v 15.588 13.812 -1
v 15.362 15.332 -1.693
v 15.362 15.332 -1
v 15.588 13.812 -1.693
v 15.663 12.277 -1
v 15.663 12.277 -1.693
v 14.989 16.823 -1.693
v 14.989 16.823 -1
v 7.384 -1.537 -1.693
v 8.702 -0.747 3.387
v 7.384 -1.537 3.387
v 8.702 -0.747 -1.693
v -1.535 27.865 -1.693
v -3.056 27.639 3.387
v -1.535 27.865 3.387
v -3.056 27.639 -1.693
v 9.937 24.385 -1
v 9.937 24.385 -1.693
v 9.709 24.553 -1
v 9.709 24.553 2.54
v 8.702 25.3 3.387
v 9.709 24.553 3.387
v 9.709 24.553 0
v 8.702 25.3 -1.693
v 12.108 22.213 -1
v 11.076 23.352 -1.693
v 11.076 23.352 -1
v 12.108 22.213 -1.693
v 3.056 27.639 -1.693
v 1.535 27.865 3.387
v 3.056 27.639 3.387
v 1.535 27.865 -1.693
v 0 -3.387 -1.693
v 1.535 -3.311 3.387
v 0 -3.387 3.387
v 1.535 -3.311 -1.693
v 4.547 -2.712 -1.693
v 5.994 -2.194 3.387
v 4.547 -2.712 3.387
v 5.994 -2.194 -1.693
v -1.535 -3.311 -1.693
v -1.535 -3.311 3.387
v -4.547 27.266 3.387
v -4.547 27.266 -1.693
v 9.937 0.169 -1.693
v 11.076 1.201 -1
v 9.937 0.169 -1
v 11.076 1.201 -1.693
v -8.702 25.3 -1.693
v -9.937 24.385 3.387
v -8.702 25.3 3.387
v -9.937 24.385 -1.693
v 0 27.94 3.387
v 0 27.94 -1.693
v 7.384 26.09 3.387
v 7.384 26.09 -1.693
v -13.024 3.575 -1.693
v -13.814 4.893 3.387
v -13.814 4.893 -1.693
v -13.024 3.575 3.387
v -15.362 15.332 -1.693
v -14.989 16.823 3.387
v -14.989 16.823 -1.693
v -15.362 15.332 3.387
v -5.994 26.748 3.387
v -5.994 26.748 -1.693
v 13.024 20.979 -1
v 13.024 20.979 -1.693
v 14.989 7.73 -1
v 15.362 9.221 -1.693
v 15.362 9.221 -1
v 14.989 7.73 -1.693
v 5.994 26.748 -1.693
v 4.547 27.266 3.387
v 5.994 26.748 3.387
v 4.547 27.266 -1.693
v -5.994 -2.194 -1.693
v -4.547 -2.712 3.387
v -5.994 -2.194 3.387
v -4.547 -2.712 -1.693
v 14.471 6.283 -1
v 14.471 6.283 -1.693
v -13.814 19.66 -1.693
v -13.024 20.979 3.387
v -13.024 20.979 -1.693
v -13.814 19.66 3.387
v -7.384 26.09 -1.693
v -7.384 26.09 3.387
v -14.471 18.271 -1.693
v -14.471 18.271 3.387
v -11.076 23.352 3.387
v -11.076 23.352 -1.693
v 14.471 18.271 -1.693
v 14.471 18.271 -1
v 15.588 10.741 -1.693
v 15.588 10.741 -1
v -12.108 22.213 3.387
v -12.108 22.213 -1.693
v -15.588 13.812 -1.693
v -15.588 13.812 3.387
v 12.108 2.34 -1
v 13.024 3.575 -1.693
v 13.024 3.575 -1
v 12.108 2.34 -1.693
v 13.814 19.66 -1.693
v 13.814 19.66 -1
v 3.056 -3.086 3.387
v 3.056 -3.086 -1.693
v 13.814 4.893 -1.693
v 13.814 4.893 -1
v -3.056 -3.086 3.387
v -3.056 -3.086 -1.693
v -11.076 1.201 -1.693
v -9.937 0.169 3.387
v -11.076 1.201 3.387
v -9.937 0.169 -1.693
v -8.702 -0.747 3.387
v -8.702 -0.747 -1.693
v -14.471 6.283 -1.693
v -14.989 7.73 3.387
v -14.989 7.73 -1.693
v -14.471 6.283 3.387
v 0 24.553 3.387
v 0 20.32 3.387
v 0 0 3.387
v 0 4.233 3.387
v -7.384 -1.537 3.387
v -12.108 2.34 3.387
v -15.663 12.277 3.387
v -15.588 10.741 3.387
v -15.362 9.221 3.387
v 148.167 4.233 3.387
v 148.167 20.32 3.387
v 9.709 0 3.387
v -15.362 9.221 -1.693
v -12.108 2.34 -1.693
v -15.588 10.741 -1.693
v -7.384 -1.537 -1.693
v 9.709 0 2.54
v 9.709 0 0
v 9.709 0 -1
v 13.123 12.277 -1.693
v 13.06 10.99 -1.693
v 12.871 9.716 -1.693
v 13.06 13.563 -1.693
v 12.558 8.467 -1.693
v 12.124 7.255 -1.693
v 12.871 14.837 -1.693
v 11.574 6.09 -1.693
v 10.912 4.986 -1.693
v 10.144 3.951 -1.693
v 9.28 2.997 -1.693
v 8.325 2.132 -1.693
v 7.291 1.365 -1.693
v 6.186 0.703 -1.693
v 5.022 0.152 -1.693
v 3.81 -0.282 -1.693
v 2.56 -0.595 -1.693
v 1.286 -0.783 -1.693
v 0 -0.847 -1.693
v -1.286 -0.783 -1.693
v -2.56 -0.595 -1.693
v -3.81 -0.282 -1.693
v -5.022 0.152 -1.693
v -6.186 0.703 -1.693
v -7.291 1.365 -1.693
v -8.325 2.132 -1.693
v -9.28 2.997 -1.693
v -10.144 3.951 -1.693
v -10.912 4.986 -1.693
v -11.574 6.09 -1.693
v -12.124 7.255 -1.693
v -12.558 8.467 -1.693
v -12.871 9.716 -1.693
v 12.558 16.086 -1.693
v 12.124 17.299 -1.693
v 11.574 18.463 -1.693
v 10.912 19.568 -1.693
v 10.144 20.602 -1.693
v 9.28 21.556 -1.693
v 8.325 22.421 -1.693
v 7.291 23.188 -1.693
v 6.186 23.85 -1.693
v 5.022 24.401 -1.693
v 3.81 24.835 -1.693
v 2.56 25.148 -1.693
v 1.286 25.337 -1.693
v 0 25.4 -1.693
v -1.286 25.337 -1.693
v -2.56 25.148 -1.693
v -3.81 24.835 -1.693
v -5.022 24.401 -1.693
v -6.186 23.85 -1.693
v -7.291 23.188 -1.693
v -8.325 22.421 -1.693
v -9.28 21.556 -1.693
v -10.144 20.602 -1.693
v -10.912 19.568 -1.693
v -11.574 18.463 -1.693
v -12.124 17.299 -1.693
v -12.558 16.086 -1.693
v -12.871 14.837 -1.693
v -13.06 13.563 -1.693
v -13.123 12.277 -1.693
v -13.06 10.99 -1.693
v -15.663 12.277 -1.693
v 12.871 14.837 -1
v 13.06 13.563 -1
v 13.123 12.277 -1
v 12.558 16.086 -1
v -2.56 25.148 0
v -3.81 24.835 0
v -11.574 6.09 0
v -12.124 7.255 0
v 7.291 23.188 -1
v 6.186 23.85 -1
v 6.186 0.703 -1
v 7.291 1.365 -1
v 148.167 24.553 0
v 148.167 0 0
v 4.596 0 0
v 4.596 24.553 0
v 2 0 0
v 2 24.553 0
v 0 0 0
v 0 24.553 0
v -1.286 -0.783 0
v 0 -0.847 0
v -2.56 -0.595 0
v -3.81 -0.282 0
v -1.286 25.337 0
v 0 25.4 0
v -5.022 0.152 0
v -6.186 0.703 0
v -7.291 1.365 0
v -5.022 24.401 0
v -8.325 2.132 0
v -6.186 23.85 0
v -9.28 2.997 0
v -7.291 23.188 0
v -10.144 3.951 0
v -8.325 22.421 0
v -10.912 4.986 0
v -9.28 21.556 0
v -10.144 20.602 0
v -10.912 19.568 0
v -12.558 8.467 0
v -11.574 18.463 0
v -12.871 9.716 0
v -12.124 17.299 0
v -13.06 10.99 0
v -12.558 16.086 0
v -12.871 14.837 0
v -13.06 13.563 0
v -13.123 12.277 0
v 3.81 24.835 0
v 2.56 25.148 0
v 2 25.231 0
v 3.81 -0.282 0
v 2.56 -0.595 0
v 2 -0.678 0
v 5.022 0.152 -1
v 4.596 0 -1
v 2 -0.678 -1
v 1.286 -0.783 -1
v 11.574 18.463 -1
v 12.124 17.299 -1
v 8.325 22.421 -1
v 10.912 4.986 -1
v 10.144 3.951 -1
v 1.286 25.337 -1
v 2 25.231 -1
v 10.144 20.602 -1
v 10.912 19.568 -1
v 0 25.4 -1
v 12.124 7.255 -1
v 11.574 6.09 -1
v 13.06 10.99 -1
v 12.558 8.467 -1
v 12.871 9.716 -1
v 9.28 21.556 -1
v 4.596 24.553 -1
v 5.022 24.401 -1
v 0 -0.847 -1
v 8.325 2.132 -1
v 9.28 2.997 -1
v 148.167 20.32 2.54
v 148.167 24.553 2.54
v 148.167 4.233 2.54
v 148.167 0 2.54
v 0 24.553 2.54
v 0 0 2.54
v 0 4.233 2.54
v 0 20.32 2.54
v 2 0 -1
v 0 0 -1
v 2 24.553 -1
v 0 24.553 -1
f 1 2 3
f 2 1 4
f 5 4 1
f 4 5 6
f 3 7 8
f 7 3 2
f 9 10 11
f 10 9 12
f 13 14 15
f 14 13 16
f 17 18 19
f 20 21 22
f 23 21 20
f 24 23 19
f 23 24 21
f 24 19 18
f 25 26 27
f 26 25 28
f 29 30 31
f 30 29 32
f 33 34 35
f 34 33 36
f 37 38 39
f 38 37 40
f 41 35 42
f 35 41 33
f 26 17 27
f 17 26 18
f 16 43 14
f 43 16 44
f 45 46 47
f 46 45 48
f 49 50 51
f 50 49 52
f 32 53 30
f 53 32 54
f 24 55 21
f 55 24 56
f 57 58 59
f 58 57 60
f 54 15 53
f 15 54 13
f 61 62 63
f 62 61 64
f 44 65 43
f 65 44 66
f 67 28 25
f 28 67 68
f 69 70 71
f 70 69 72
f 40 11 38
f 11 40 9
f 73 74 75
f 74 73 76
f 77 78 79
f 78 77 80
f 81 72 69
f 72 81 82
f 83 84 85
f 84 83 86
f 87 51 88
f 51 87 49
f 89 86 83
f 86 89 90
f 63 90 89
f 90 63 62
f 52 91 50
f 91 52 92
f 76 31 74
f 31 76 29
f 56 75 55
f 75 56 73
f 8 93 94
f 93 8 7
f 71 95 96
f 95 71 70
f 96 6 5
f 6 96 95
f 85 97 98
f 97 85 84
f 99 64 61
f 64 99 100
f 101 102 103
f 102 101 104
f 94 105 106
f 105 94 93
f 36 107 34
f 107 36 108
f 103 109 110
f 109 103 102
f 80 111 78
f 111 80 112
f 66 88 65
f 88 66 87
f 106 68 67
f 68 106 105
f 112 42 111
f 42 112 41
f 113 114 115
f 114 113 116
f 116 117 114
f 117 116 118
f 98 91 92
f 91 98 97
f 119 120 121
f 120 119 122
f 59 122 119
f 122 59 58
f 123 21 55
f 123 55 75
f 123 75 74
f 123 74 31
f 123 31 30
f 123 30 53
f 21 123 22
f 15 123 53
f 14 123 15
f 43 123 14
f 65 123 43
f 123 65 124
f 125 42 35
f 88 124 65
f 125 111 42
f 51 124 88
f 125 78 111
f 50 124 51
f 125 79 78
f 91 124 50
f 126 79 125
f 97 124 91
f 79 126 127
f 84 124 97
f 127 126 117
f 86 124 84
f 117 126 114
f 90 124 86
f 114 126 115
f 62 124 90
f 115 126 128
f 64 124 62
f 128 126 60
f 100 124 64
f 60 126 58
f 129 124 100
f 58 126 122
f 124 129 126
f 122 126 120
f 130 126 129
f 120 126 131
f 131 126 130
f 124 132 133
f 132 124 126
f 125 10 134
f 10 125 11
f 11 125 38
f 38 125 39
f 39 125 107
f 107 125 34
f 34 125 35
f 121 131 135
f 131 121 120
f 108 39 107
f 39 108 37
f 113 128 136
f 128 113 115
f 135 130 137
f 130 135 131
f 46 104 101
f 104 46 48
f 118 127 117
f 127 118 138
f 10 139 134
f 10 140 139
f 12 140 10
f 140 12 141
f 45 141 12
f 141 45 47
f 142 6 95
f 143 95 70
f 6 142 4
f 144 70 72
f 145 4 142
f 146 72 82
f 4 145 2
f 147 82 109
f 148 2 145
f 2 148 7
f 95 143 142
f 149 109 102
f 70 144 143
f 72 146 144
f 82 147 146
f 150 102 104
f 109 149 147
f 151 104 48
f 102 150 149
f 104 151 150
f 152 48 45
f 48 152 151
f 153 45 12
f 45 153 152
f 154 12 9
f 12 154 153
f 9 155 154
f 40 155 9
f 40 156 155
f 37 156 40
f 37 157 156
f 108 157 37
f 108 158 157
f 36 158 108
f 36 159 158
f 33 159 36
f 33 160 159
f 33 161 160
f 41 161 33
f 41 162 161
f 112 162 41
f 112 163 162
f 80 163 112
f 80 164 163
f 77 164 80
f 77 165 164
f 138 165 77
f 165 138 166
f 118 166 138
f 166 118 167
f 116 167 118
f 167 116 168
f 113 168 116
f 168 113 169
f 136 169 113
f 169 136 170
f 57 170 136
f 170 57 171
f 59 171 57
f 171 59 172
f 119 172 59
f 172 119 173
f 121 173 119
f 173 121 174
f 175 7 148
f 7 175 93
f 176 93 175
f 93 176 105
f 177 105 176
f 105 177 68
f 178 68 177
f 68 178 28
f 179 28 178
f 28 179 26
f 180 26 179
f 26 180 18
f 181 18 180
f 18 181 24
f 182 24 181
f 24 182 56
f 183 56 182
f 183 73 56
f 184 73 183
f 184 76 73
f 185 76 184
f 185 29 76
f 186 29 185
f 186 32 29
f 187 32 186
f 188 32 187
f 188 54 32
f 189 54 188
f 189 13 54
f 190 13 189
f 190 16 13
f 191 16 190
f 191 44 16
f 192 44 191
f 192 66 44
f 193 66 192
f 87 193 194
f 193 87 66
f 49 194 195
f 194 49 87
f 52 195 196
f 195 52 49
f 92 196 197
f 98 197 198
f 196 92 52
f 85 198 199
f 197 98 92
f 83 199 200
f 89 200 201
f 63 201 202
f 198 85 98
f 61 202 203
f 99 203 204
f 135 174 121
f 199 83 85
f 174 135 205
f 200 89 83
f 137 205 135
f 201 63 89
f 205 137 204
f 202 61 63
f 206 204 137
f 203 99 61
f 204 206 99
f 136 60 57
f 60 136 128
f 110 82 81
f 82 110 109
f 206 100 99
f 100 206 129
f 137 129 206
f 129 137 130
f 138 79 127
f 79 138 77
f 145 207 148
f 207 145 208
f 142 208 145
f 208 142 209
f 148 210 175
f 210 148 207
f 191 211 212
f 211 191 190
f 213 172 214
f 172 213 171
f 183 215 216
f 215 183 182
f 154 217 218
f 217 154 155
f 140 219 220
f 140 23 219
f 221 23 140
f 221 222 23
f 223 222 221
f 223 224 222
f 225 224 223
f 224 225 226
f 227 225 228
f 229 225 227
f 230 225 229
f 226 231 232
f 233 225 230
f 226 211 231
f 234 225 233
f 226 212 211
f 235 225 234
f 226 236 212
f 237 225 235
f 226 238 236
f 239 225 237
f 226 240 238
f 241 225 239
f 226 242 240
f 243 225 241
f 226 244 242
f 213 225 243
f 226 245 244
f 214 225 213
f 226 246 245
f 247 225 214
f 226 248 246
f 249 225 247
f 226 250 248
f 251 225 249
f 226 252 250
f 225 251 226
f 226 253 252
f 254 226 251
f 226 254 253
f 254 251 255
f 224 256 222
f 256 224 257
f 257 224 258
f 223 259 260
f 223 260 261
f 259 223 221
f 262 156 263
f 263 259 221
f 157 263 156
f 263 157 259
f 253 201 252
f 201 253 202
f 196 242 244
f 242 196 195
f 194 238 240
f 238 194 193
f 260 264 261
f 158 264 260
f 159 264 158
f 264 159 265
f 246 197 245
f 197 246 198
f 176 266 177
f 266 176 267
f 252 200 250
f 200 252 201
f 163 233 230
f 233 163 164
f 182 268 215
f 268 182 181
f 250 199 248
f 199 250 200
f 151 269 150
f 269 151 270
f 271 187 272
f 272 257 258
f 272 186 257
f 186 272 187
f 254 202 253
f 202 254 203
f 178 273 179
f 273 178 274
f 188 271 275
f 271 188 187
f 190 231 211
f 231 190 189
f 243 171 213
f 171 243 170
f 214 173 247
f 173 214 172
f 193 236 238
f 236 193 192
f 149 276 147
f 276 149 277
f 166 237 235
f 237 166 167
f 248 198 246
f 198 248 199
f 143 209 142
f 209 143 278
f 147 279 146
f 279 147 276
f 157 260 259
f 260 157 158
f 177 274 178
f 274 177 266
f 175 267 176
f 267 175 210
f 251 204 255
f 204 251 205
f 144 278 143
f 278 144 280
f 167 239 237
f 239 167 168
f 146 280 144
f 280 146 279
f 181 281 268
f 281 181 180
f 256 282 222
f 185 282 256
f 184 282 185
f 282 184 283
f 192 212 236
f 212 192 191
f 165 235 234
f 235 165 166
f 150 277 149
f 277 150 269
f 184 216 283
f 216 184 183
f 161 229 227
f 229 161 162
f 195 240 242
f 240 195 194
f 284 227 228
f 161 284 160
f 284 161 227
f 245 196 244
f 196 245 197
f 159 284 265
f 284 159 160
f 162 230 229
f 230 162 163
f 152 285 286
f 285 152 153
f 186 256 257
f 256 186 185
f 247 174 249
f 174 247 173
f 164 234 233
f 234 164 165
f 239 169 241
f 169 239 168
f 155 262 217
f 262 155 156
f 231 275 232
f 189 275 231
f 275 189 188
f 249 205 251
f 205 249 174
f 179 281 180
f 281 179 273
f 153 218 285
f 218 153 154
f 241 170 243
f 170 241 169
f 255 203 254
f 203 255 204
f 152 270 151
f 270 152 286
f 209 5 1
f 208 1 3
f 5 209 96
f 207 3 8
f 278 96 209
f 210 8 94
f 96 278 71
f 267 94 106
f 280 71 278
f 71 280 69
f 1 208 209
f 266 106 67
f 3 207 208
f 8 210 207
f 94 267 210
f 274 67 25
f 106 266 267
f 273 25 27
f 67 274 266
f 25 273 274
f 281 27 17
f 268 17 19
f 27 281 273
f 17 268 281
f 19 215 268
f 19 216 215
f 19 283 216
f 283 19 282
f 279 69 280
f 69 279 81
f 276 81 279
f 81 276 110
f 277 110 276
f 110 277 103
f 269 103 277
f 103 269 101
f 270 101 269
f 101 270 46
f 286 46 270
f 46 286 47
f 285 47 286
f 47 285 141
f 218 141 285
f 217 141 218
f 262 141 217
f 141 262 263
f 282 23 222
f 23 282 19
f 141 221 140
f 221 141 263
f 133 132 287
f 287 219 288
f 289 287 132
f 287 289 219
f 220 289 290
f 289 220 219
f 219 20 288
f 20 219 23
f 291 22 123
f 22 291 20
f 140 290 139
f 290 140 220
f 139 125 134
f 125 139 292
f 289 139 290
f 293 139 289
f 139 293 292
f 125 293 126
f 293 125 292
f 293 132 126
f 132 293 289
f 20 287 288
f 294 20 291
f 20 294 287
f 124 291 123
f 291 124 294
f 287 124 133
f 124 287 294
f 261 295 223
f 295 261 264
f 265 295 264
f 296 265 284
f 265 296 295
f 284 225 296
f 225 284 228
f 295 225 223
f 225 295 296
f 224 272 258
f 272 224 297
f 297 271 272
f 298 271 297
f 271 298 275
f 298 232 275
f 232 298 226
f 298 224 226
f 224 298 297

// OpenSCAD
scale = 25.4 / 3;

length_x = scale * 17.5;
width_y = scale * 2.9;
height_z = scale * 0.4;

radius = scale * 1.85;
tab_height_y = scale * 0.6;
wall_thickness = scale * 0.3;

rail_width = scale * 0.5;

saw_height = scale * 0.4;
saw_width  = scale * 0.4;
num_teeth = 70;
saw_inset = scale * 0.2;

module sawtooth_pattern()
{
    for (i = [0 : num_teeth - 1])
    {
        polygon(points=[
            [i * saw_width, 0],
            [i * saw_width + saw_width, saw_height],
            [i * saw_width + saw_width, 0]
        ]);
    }
}


translate([0, -2, -1])
{
cube([2, 2, 2]);
}

translate([0, width_y, -1])
{
cube([2, 2, 2]);
}

    // top of the tree

difference()
{
    color("#ffbbee")
    {
        union()
        {
            cube([length_x, width_y, height_z]);
    
            difference()
            {
                translate([0, width_y/2, height_z - tab_height_y])
                {
                    cylinder(tab_height_y, radius, radius, $fn = 64);
                }
                
                color("#0000FF")
                {
                    translate([0, width_y/2, -height_z])
                    {
                        cylinder(height_z, radius - wall_thickness, radius - wall_thickness, $fn = 64);
                    }
                }
                
                translate([0, 0, -1])
{
    cube([radius + wall_thickness, width_y, 1]);
}
            }
        }    
    }
    
    union()
    {

translate([0, -width_y/2, height_z + saw_inset])
{
rotate([270, 0, 0])
{
linear_extrude(2 * width_y)
{
     sawtooth_pattern();
}
}
}

translate([0, 0, 3* height_z / 4])
{
    cube([length_x, rail_width, height_z / 2]);
    
    translate([0, width_y - rail_width, 0])
    {
        cube([length_x, rail_width, height_z / 2]);
    }
}
}

translate([0, -2, -1])
{
cube([2, 2, 2]);
}

translate([0, width_y, -1])
{
cube([2, 2, 2]);
}

}
